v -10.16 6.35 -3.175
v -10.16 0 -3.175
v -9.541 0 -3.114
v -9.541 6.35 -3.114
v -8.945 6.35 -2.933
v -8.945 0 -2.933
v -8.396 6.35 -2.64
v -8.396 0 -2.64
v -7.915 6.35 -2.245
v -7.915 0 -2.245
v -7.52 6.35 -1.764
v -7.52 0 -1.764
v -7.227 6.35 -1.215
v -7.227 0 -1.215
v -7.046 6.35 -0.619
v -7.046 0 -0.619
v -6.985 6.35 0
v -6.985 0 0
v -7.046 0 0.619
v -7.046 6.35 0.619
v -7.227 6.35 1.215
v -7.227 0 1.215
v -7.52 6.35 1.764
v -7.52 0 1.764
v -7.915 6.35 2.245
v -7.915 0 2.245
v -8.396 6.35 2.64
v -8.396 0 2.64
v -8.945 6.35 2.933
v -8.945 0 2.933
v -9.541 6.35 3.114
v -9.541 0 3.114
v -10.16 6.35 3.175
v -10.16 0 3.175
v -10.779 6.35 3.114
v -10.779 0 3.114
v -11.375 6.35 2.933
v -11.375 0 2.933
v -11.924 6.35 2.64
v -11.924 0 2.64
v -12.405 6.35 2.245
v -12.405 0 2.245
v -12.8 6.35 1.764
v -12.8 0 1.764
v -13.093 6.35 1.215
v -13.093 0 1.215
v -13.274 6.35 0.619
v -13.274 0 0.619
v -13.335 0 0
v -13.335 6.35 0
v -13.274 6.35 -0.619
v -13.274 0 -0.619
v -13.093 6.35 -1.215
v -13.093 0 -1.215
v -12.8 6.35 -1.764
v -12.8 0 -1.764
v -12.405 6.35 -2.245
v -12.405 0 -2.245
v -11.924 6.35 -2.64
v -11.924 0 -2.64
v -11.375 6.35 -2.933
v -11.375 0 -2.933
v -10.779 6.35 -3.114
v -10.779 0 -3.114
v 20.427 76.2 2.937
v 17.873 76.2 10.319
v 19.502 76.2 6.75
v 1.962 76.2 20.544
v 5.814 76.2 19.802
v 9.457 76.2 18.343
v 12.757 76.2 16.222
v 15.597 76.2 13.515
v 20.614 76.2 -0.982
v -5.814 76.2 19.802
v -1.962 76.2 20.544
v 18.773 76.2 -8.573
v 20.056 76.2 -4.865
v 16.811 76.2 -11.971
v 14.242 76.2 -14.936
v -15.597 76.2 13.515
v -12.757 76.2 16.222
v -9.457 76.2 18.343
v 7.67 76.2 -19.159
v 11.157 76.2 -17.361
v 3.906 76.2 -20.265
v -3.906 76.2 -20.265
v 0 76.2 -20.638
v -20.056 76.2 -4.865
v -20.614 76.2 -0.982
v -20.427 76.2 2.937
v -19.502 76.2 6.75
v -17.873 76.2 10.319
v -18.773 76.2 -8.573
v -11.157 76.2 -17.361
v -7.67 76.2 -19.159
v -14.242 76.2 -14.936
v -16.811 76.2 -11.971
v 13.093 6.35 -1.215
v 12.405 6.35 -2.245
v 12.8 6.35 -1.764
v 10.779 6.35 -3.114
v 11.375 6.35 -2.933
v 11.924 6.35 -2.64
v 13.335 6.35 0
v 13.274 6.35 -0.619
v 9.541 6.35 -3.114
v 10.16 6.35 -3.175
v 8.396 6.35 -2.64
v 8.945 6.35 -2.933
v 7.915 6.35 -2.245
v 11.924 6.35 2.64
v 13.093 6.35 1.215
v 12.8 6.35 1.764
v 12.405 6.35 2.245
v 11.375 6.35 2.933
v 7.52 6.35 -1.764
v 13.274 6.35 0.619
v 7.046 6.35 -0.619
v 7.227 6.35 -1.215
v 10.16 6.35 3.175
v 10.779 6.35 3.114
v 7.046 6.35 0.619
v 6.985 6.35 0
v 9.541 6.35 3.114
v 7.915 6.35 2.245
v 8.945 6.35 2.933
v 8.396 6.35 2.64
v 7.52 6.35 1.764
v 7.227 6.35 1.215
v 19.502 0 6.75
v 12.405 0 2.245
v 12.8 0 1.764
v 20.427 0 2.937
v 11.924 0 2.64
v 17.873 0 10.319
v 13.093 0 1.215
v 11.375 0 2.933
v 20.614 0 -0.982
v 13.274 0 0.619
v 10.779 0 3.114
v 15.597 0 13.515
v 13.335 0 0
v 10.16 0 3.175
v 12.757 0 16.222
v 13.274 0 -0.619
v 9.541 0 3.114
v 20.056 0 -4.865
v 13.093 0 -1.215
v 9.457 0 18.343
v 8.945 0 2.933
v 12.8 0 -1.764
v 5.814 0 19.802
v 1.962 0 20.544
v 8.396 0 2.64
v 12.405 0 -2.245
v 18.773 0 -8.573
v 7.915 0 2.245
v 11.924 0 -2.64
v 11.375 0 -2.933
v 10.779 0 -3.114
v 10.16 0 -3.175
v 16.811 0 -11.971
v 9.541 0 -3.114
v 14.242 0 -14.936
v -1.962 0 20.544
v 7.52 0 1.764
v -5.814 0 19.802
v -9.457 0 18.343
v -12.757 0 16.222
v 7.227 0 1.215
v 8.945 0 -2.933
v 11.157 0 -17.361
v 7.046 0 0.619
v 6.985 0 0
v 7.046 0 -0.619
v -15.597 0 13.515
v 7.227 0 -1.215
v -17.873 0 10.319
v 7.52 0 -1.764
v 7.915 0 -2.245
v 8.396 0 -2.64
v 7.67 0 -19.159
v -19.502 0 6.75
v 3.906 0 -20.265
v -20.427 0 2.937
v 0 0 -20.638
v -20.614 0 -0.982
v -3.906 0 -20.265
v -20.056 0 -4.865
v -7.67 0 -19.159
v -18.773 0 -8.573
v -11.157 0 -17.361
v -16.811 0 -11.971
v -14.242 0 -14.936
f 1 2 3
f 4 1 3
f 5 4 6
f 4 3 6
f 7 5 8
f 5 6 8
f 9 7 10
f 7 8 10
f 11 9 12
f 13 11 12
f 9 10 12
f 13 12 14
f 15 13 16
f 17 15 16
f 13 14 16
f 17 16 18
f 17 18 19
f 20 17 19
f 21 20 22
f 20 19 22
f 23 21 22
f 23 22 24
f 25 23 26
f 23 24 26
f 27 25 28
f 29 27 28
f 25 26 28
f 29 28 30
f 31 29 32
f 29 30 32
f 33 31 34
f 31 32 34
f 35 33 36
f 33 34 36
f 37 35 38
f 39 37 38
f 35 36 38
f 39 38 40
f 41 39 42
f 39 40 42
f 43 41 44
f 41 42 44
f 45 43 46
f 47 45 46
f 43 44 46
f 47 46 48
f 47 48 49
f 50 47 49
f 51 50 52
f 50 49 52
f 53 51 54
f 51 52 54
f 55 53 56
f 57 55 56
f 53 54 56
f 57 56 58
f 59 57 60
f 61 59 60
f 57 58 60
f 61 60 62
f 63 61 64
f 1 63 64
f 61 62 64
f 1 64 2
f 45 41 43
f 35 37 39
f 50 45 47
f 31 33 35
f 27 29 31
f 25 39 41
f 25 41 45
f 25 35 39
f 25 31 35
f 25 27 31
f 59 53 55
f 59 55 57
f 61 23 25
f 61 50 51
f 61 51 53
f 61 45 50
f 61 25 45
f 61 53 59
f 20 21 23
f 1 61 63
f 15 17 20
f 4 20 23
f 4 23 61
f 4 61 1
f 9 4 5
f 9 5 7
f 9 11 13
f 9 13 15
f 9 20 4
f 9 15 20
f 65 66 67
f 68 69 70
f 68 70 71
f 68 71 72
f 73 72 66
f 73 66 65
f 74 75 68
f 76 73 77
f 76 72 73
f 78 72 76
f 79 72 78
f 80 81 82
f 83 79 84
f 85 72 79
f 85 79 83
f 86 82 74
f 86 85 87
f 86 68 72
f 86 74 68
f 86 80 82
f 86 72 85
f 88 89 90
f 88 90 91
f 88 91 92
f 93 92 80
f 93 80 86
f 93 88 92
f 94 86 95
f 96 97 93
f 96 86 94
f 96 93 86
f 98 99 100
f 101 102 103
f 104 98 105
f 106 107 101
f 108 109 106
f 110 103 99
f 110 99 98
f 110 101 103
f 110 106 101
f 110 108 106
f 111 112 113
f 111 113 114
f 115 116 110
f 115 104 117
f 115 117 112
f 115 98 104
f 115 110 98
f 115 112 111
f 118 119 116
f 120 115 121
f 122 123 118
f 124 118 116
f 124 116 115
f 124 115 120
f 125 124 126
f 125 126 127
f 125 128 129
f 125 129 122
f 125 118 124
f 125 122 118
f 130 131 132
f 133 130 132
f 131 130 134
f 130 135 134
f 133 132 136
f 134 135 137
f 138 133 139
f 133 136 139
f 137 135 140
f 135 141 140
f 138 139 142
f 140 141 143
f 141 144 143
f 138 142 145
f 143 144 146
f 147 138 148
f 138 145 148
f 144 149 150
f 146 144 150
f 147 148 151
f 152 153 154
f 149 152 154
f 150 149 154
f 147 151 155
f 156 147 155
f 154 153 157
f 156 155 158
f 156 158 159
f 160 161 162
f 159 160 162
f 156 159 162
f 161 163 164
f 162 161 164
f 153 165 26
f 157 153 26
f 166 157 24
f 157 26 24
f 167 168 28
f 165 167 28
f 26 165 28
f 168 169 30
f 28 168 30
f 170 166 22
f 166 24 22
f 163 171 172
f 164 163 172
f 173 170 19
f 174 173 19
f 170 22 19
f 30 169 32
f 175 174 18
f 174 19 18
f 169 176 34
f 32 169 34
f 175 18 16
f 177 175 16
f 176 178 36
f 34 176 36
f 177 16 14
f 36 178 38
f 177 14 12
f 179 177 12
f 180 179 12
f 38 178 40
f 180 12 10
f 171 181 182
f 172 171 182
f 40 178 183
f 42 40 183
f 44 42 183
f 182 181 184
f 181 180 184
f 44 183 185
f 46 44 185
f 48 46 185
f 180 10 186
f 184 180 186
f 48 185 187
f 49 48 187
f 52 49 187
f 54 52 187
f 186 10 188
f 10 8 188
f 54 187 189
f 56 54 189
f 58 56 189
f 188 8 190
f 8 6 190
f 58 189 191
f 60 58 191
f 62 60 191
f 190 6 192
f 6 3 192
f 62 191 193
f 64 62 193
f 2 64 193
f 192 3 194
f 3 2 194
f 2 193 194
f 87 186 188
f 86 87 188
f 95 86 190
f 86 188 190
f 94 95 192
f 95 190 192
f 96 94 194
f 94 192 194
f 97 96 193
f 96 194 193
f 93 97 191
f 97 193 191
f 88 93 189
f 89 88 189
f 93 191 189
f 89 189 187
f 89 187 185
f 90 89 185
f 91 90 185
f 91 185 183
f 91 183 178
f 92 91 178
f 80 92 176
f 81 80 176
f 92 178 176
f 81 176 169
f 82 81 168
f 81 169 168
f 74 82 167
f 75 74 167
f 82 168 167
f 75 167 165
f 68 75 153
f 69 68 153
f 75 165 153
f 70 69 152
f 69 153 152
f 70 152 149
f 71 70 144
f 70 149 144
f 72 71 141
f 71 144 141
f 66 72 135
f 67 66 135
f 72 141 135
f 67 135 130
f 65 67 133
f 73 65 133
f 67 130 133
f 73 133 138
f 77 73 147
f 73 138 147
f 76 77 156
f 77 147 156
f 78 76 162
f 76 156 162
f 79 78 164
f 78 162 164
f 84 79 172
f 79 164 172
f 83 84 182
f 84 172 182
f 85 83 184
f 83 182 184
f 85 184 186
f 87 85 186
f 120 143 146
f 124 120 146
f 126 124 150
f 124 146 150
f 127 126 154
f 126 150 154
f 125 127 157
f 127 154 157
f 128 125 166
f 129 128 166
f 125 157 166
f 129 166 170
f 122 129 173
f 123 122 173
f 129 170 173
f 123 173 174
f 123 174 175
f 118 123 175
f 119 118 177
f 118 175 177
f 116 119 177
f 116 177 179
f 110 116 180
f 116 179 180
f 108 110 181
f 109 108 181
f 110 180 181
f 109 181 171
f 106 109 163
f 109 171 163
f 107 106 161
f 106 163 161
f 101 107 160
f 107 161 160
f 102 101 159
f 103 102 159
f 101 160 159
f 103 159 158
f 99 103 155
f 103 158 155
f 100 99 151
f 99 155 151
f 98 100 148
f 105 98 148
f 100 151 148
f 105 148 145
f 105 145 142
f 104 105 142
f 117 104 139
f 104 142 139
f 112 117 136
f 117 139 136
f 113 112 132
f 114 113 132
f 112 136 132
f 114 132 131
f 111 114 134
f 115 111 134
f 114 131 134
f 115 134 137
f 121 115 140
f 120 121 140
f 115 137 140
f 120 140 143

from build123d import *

# Parameters (mm, degrees)
SKETCH1_R           = 20.6375
BOSS_EXTRUDE1_DEPTH = 76.2
SKETCH2_R           = 3.175
CUT_EXTRUDE1_DEPTH  = 6.35


with BuildPart() as part:
    # Sketch1 → Boss-Extrude1 (new body)
    with BuildSketch(Plane(origin=(0, 0, 0), x_dir=(1, 0, 0), z_dir=(0, 1, 0))):
        with Locations(Location((0, 0, 0), (0, 0, 90))):
            Circle(SKETCH1_R)
    extrude(amount=BOSS_EXTRUDE1_DEPTH)

    # Sketch2 → Cut-Extrude1 (cut)
    with BuildSketch(Plane.XZ):
        with Locations(Location((-10.16, 0, 0), (0, 0, 270))):
            Circle(SKETCH2_R)
        with Locations(Location((10.16, 0, 0), (0, 0, 90))):
            Circle(SKETCH2_R)
    extrude(amount=-CUT_EXTRUDE1_DEPTH, mode=Mode.SUBTRACT)


solid = part.part
